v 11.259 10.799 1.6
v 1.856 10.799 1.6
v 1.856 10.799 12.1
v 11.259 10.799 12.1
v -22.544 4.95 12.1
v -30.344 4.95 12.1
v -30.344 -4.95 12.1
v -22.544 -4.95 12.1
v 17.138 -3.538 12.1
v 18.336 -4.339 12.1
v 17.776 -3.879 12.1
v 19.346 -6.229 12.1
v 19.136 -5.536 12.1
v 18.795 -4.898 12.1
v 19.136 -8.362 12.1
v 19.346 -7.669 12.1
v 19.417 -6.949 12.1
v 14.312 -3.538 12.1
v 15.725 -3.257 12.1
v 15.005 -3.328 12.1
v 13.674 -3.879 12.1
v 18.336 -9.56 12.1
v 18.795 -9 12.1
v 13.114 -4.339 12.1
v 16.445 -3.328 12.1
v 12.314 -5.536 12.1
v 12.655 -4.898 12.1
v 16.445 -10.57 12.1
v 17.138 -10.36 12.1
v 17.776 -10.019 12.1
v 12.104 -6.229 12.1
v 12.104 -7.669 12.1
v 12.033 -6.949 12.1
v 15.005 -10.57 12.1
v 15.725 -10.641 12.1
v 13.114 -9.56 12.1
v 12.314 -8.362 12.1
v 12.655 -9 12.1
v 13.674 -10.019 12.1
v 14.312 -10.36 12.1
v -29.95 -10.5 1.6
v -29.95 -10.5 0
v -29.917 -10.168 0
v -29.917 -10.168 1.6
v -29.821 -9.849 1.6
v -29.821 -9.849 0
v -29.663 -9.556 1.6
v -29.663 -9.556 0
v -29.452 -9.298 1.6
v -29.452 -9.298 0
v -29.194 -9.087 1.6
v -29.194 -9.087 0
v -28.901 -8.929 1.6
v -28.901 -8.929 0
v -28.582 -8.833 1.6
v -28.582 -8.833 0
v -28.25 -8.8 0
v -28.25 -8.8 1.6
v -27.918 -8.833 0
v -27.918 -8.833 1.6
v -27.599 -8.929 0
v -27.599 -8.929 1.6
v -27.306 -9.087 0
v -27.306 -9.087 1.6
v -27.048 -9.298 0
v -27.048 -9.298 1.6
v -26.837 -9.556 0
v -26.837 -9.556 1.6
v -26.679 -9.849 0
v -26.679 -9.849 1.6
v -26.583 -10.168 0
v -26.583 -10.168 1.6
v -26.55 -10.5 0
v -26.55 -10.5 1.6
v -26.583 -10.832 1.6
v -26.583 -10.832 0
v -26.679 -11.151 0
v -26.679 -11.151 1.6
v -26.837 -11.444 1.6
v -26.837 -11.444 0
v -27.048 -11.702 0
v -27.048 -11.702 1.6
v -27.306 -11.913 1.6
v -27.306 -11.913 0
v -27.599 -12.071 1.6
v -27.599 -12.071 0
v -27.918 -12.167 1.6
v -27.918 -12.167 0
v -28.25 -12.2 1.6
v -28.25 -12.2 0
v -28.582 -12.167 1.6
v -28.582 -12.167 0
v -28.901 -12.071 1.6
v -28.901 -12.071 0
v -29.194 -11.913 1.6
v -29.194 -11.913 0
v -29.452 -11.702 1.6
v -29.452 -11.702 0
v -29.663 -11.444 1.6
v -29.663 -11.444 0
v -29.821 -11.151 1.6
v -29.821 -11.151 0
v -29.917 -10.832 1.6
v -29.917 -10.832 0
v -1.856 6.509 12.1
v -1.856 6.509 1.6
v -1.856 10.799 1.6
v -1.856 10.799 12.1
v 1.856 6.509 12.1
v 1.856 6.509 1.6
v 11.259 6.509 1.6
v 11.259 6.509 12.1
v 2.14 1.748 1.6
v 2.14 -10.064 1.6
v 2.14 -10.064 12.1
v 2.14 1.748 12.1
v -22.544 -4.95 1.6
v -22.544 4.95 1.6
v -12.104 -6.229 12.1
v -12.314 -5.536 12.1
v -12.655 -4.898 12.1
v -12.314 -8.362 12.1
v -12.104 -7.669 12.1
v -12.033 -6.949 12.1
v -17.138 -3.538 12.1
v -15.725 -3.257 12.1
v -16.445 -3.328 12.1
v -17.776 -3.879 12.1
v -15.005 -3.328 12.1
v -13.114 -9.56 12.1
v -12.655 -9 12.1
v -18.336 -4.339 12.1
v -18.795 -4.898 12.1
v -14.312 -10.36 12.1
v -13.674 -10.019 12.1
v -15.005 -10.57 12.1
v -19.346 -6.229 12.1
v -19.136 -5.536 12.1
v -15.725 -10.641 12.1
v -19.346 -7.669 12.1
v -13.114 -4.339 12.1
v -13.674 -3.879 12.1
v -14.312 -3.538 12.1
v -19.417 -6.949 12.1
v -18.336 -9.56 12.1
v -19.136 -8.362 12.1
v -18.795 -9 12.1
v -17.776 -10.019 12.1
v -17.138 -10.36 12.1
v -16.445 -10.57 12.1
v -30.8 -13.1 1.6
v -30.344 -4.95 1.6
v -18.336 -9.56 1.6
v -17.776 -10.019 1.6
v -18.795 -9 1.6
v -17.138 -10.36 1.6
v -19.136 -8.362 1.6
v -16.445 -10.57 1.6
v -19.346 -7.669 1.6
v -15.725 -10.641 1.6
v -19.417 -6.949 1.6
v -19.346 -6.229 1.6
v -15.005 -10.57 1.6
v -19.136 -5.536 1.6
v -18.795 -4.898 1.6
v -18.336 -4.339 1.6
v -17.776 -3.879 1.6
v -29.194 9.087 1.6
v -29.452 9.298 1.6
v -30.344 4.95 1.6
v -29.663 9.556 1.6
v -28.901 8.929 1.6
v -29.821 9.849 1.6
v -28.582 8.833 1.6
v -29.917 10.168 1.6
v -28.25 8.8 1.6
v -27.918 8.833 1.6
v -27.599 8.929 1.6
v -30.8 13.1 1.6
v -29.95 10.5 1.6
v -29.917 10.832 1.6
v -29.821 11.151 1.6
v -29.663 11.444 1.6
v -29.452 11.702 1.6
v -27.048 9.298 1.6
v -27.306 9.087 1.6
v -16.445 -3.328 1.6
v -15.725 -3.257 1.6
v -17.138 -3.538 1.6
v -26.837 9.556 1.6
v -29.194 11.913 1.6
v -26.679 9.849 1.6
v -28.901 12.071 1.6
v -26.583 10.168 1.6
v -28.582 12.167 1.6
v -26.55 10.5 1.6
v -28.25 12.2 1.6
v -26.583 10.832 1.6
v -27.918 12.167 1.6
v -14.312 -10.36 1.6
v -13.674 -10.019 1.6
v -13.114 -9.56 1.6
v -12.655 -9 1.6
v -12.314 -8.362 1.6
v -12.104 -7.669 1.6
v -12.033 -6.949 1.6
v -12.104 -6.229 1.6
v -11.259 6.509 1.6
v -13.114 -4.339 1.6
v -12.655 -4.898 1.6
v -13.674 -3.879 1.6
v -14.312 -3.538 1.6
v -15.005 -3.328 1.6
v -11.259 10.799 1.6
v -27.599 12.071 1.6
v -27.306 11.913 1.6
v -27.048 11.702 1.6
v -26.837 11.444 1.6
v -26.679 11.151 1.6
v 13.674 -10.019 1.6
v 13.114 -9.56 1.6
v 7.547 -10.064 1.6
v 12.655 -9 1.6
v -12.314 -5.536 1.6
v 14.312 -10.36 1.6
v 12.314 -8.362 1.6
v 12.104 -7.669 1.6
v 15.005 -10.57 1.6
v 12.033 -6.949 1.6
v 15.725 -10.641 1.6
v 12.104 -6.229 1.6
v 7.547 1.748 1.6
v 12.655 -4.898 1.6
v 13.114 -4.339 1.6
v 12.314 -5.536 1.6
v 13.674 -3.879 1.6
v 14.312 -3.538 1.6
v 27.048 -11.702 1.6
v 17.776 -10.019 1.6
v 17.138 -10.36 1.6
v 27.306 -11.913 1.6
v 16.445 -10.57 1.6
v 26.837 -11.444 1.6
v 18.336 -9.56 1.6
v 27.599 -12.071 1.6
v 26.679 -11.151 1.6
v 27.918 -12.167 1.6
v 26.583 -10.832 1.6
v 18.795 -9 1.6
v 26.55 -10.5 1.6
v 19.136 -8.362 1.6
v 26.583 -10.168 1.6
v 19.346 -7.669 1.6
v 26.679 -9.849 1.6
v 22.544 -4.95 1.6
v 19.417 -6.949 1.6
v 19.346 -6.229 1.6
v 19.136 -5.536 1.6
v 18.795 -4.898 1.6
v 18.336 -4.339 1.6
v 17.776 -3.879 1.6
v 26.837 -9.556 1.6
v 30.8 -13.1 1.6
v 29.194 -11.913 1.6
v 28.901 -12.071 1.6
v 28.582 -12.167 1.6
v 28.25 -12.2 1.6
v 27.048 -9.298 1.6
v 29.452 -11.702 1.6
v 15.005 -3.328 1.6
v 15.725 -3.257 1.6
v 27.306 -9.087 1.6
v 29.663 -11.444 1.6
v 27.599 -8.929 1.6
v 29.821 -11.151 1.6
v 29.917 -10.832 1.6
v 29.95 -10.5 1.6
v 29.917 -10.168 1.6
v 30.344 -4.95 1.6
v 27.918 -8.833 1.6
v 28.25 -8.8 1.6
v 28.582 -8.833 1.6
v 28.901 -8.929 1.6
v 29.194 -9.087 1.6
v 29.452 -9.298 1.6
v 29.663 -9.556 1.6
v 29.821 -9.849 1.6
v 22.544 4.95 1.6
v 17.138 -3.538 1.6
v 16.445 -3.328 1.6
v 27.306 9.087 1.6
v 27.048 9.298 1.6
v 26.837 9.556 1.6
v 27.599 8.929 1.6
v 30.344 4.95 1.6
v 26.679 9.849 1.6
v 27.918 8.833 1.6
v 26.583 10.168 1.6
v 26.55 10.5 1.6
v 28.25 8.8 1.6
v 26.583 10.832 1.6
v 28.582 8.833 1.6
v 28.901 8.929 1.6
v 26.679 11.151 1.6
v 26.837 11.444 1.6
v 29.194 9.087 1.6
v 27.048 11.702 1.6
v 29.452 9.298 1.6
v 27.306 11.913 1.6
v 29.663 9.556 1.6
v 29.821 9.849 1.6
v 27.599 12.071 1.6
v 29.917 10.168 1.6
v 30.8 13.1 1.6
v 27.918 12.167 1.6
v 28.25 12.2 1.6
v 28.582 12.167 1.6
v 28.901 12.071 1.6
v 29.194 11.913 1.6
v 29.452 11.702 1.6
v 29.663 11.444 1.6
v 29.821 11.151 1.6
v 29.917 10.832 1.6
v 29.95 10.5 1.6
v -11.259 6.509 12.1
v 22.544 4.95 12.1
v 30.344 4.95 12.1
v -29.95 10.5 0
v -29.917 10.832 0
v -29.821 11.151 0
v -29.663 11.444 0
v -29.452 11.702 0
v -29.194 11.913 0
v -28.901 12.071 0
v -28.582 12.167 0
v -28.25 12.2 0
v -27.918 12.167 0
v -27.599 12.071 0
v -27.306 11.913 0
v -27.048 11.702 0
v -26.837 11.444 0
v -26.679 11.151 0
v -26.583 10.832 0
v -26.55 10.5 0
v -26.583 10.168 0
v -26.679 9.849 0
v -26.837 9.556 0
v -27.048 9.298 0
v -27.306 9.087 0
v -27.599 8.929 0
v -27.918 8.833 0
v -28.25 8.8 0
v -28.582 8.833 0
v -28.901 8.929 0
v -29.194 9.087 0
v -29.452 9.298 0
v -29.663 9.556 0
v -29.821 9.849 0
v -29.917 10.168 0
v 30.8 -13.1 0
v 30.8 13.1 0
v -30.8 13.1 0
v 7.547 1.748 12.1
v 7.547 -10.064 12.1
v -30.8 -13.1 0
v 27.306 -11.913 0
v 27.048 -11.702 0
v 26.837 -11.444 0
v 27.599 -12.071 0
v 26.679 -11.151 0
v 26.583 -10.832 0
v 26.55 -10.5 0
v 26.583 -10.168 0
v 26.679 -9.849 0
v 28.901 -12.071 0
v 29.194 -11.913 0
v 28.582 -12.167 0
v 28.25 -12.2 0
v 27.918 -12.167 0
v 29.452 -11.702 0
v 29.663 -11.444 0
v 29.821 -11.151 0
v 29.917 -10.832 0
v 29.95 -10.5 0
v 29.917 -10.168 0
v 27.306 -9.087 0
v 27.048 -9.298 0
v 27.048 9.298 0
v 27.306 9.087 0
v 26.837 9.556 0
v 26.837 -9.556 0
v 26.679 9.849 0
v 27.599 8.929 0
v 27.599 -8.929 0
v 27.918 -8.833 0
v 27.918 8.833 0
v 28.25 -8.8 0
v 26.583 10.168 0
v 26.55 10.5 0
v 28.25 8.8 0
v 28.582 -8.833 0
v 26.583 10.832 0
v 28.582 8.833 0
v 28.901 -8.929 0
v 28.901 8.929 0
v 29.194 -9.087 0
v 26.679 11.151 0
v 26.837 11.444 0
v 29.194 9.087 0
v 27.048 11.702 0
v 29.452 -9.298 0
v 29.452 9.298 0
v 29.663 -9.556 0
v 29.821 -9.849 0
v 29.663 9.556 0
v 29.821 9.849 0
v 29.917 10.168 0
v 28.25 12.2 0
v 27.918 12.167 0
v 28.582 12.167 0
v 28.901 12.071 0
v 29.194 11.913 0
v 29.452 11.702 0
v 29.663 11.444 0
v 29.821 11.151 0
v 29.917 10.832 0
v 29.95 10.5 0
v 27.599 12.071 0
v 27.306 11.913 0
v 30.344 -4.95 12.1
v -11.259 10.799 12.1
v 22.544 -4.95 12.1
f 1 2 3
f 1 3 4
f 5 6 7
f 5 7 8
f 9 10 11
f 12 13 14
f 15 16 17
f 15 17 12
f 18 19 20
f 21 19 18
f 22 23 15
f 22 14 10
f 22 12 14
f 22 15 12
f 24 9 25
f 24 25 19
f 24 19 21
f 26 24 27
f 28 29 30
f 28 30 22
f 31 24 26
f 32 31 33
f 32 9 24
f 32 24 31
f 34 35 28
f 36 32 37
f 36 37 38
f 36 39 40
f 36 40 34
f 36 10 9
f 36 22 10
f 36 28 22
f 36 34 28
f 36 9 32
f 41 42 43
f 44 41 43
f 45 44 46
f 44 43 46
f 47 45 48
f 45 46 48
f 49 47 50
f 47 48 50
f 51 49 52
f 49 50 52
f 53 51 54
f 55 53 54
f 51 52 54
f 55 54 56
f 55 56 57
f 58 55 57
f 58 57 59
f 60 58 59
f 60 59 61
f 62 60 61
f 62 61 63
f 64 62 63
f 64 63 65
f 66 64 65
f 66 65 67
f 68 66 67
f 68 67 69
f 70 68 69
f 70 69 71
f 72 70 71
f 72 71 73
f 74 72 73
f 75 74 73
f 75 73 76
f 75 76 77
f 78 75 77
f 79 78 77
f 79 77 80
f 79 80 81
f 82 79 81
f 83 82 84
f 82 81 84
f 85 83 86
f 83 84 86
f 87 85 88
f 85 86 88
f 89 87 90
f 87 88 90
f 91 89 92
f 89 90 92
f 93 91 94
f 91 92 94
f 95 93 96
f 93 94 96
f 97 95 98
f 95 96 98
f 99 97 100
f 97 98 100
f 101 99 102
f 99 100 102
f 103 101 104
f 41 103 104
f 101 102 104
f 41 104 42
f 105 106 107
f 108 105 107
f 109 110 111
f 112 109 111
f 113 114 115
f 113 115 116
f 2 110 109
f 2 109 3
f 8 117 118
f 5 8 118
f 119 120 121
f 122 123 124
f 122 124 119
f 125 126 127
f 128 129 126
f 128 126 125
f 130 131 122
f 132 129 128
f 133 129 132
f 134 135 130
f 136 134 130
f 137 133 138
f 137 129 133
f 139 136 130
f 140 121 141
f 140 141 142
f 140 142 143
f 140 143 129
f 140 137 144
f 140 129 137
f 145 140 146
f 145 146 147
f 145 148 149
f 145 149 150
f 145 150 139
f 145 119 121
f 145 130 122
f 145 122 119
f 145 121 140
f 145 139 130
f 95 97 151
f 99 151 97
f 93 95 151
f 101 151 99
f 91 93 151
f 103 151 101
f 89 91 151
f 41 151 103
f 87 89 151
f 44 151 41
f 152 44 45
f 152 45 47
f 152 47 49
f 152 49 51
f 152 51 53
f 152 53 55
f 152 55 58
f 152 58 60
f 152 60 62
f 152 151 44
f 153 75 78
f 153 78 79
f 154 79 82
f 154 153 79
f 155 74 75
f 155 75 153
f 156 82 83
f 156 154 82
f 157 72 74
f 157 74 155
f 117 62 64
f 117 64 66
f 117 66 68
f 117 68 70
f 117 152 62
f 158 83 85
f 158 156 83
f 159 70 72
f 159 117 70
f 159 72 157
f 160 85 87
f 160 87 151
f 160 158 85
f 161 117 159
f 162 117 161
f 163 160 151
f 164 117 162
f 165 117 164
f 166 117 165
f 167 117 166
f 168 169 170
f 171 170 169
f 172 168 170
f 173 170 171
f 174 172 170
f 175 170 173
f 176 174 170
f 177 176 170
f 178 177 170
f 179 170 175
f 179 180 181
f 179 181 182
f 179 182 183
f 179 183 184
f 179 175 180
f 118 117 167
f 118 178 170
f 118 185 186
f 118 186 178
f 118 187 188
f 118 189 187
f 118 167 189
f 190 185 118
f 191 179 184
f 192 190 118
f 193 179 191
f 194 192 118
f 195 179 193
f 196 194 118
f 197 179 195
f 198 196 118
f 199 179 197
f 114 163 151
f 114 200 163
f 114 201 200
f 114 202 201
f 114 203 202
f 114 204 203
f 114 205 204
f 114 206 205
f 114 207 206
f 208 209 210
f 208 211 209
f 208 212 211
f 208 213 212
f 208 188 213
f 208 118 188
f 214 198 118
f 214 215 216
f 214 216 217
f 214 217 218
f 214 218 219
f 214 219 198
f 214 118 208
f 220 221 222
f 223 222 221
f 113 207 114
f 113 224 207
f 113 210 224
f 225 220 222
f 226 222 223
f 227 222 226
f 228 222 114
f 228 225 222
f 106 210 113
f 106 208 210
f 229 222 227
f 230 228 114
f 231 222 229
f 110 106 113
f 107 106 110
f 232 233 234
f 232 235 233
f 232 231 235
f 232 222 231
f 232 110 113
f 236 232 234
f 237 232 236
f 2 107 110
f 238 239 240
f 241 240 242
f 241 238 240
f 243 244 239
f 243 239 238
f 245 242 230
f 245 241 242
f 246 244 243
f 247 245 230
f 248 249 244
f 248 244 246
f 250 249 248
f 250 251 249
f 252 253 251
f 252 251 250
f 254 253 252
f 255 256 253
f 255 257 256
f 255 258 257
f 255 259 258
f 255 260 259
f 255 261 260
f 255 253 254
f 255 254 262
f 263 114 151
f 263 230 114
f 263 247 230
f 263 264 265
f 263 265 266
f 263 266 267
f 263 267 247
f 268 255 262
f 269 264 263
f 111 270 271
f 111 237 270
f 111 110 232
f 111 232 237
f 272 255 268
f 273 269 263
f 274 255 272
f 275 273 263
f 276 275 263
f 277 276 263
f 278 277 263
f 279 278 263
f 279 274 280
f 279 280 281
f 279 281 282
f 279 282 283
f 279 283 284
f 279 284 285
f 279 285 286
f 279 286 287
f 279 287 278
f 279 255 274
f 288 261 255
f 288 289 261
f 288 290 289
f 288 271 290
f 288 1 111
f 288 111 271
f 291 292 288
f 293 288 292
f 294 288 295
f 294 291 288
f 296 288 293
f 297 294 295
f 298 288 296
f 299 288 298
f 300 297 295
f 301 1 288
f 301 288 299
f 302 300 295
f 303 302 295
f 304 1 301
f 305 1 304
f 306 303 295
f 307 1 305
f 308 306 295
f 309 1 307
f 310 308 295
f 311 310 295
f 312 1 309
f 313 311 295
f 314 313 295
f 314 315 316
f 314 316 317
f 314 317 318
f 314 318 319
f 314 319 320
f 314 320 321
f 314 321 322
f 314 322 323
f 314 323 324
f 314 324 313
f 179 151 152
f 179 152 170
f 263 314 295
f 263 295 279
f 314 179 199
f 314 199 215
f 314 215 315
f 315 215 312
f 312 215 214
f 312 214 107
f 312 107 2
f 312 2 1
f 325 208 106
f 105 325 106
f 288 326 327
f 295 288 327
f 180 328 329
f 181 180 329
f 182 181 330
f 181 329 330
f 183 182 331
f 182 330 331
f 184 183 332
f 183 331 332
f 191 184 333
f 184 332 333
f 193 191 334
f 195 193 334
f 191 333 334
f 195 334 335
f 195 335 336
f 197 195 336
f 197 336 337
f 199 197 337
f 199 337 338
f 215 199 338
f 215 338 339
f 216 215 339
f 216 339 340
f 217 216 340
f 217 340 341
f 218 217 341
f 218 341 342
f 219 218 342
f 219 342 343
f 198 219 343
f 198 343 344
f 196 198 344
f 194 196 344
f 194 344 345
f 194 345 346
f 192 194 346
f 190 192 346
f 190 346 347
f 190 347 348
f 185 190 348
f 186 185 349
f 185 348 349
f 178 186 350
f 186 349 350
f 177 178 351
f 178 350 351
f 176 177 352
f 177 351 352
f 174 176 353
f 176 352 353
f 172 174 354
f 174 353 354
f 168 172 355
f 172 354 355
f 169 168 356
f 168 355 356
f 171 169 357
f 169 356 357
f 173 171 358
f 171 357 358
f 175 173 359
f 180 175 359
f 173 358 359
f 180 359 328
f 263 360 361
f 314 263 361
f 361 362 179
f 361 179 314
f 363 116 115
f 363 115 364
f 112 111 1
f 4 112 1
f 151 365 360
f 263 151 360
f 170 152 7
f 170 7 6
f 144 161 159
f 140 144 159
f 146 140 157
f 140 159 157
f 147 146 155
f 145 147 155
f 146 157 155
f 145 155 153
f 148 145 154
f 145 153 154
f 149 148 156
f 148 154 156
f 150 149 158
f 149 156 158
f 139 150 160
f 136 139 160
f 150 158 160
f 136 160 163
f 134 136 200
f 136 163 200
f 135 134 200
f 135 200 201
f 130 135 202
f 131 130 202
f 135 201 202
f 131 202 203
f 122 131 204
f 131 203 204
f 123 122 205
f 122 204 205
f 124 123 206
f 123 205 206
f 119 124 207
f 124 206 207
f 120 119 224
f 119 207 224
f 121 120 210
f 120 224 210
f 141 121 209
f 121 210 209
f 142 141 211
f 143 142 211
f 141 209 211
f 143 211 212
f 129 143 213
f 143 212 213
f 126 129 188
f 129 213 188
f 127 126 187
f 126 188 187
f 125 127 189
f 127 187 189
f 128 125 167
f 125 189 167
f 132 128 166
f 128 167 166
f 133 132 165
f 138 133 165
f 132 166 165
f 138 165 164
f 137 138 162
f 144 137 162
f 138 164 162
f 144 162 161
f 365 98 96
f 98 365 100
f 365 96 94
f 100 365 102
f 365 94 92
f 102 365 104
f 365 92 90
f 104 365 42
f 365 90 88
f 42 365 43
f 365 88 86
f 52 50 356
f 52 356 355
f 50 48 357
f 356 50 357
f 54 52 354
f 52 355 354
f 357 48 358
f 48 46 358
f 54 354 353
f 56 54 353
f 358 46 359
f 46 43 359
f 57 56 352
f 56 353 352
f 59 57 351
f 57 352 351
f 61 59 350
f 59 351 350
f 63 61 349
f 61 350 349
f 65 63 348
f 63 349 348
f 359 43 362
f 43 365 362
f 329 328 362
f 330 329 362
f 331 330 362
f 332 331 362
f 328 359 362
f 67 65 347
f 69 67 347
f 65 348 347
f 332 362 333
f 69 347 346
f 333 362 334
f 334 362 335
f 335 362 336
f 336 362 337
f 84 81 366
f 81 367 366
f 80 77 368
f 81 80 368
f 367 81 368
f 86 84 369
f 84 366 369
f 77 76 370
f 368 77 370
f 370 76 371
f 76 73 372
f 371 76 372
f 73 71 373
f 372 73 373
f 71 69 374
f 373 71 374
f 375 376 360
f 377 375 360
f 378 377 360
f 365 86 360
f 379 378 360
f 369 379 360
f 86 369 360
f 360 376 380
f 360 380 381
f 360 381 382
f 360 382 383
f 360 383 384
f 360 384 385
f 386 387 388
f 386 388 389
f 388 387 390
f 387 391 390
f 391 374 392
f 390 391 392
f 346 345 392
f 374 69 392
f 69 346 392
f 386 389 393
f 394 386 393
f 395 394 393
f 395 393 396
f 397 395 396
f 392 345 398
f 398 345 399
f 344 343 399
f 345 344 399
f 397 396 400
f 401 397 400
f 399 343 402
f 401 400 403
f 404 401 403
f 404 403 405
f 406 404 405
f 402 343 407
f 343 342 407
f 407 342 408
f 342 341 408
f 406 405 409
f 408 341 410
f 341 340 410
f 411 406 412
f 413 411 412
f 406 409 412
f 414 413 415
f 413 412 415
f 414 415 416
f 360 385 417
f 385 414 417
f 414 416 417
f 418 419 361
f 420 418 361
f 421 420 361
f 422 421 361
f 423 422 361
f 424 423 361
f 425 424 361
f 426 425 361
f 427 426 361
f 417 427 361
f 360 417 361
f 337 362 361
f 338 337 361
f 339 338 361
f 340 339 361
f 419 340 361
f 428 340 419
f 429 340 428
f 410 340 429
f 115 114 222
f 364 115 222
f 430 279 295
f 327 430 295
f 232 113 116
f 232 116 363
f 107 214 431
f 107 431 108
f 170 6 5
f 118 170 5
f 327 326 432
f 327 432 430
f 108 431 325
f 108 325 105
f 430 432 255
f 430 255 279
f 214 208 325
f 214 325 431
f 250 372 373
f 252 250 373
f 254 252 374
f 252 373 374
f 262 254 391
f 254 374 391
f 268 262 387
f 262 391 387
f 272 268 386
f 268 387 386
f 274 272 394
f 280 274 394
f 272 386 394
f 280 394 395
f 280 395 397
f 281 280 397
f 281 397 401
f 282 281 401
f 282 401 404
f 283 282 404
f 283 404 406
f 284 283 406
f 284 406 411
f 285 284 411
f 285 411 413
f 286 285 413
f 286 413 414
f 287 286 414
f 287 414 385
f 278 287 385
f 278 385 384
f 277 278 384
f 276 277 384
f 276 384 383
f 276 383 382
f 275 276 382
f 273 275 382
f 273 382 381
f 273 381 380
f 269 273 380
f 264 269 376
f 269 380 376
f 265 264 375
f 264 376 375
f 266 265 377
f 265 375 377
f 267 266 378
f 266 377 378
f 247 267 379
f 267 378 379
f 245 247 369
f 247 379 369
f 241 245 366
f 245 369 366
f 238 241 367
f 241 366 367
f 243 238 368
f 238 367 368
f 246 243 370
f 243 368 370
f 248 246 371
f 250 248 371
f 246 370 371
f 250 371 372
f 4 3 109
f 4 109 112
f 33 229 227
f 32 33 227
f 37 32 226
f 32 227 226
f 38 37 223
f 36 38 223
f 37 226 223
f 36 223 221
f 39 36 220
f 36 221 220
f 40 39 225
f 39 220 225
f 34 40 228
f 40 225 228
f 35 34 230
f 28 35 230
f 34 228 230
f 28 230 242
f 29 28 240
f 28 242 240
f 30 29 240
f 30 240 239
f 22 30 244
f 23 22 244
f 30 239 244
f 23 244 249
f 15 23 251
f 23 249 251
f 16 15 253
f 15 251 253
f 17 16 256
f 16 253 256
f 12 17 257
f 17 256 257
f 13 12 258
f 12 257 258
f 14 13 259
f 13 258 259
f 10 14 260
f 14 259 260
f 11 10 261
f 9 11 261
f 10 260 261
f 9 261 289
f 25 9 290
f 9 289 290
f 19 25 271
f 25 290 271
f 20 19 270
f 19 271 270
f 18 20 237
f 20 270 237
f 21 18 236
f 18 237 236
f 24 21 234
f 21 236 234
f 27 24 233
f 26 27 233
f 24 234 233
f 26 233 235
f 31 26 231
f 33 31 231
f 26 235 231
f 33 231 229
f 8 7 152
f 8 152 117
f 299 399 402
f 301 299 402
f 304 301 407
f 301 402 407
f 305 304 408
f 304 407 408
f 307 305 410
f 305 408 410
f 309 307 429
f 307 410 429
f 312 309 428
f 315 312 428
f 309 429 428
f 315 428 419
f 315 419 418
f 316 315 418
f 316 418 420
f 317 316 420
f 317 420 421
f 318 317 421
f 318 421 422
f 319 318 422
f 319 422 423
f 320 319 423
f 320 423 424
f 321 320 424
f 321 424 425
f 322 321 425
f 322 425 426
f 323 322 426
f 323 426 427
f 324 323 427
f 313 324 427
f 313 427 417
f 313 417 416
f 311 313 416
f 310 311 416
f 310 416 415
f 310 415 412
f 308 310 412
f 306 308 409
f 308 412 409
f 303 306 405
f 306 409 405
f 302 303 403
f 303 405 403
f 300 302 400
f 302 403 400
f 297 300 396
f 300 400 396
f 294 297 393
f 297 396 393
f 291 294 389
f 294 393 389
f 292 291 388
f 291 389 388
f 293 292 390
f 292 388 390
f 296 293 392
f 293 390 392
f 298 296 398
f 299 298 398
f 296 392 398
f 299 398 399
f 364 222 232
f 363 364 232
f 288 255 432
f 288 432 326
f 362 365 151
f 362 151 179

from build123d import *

# Parameters (mm, degrees)
ESQUISSE1_W        = 61.6
ESQUISSE1_H        = 26.2
BOSS_EXTRU_1_DEPTH = 1.6
D_GAGEMENT_M31_D   = 3.4
ESQUISSE5_R        = 3.691889044
ESQUISSE5_W        = 7.8
ESQUISSE5_H        = 9.9
ESQUISSE5_W_2      = 9.402735495
ESQUISSE5_H_2      = 4.28999807
ESQUISSE5_W_3      = 5.40657291
ESQUISSE5_H_3      = 11.812186467
BOSS_EXTRU_2_DEPTH = 10.5


with BuildPart() as part:
    # Esquisse1 → Boss.-Extru.1 (new body)
    with BuildSketch(Plane.XY):
        Rectangle(ESQUISSE1_W, ESQUISSE1_H)
    extrude(amount=BOSS_EXTRU_1_DEPTH)

    # Dégagement M31 (through all)
    with Locations(Plane.XY.offset(1.6)):
        with Locations((-28.25, 10.5), (28.25, 10.5), (28.25, -10.5), (-28.25, -10.5)):
            Hole(D_GAGEMENT_M31_D / 2)

    # Esquisse5 → Boss.-Extru.2 (add)
    with BuildSketch(Plane.XY.offset(1.6)):
        with Locations(Location((-15.725040559, -6.949067891, 0), (0, 0, 180))):
            Circle(ESQUISSE5_R)
        with Locations(Location((15.725040559, -6.949067891, 0), (0, 0, 180))):
            Circle(ESQUISSE5_R)
        with Locations((-26.443929164, 0)):
            Rectangle(ESQUISSE5_W, ESQUISSE5_H)
        with Locations((26.443929164, 0)):
            Rectangle(ESQUISSE5_W, ESQUISSE5_H)
        with Locations((6.557373451, 8.653596323)):
            Rectangle(ESQUISSE5_W_2, ESQUISSE5_H_2)
        with Locations((4.843443338, -4.157630791)):
            Rectangle(ESQUISSE5_W_3, ESQUISSE5_H_3)
        with Locations((-6.557373451, 8.653596323)):
            Rectangle(ESQUISSE5_W_2, ESQUISSE5_H_2)
    extrude(amount=BOSS_EXTRU_2_DEPTH)


solid = part.part
